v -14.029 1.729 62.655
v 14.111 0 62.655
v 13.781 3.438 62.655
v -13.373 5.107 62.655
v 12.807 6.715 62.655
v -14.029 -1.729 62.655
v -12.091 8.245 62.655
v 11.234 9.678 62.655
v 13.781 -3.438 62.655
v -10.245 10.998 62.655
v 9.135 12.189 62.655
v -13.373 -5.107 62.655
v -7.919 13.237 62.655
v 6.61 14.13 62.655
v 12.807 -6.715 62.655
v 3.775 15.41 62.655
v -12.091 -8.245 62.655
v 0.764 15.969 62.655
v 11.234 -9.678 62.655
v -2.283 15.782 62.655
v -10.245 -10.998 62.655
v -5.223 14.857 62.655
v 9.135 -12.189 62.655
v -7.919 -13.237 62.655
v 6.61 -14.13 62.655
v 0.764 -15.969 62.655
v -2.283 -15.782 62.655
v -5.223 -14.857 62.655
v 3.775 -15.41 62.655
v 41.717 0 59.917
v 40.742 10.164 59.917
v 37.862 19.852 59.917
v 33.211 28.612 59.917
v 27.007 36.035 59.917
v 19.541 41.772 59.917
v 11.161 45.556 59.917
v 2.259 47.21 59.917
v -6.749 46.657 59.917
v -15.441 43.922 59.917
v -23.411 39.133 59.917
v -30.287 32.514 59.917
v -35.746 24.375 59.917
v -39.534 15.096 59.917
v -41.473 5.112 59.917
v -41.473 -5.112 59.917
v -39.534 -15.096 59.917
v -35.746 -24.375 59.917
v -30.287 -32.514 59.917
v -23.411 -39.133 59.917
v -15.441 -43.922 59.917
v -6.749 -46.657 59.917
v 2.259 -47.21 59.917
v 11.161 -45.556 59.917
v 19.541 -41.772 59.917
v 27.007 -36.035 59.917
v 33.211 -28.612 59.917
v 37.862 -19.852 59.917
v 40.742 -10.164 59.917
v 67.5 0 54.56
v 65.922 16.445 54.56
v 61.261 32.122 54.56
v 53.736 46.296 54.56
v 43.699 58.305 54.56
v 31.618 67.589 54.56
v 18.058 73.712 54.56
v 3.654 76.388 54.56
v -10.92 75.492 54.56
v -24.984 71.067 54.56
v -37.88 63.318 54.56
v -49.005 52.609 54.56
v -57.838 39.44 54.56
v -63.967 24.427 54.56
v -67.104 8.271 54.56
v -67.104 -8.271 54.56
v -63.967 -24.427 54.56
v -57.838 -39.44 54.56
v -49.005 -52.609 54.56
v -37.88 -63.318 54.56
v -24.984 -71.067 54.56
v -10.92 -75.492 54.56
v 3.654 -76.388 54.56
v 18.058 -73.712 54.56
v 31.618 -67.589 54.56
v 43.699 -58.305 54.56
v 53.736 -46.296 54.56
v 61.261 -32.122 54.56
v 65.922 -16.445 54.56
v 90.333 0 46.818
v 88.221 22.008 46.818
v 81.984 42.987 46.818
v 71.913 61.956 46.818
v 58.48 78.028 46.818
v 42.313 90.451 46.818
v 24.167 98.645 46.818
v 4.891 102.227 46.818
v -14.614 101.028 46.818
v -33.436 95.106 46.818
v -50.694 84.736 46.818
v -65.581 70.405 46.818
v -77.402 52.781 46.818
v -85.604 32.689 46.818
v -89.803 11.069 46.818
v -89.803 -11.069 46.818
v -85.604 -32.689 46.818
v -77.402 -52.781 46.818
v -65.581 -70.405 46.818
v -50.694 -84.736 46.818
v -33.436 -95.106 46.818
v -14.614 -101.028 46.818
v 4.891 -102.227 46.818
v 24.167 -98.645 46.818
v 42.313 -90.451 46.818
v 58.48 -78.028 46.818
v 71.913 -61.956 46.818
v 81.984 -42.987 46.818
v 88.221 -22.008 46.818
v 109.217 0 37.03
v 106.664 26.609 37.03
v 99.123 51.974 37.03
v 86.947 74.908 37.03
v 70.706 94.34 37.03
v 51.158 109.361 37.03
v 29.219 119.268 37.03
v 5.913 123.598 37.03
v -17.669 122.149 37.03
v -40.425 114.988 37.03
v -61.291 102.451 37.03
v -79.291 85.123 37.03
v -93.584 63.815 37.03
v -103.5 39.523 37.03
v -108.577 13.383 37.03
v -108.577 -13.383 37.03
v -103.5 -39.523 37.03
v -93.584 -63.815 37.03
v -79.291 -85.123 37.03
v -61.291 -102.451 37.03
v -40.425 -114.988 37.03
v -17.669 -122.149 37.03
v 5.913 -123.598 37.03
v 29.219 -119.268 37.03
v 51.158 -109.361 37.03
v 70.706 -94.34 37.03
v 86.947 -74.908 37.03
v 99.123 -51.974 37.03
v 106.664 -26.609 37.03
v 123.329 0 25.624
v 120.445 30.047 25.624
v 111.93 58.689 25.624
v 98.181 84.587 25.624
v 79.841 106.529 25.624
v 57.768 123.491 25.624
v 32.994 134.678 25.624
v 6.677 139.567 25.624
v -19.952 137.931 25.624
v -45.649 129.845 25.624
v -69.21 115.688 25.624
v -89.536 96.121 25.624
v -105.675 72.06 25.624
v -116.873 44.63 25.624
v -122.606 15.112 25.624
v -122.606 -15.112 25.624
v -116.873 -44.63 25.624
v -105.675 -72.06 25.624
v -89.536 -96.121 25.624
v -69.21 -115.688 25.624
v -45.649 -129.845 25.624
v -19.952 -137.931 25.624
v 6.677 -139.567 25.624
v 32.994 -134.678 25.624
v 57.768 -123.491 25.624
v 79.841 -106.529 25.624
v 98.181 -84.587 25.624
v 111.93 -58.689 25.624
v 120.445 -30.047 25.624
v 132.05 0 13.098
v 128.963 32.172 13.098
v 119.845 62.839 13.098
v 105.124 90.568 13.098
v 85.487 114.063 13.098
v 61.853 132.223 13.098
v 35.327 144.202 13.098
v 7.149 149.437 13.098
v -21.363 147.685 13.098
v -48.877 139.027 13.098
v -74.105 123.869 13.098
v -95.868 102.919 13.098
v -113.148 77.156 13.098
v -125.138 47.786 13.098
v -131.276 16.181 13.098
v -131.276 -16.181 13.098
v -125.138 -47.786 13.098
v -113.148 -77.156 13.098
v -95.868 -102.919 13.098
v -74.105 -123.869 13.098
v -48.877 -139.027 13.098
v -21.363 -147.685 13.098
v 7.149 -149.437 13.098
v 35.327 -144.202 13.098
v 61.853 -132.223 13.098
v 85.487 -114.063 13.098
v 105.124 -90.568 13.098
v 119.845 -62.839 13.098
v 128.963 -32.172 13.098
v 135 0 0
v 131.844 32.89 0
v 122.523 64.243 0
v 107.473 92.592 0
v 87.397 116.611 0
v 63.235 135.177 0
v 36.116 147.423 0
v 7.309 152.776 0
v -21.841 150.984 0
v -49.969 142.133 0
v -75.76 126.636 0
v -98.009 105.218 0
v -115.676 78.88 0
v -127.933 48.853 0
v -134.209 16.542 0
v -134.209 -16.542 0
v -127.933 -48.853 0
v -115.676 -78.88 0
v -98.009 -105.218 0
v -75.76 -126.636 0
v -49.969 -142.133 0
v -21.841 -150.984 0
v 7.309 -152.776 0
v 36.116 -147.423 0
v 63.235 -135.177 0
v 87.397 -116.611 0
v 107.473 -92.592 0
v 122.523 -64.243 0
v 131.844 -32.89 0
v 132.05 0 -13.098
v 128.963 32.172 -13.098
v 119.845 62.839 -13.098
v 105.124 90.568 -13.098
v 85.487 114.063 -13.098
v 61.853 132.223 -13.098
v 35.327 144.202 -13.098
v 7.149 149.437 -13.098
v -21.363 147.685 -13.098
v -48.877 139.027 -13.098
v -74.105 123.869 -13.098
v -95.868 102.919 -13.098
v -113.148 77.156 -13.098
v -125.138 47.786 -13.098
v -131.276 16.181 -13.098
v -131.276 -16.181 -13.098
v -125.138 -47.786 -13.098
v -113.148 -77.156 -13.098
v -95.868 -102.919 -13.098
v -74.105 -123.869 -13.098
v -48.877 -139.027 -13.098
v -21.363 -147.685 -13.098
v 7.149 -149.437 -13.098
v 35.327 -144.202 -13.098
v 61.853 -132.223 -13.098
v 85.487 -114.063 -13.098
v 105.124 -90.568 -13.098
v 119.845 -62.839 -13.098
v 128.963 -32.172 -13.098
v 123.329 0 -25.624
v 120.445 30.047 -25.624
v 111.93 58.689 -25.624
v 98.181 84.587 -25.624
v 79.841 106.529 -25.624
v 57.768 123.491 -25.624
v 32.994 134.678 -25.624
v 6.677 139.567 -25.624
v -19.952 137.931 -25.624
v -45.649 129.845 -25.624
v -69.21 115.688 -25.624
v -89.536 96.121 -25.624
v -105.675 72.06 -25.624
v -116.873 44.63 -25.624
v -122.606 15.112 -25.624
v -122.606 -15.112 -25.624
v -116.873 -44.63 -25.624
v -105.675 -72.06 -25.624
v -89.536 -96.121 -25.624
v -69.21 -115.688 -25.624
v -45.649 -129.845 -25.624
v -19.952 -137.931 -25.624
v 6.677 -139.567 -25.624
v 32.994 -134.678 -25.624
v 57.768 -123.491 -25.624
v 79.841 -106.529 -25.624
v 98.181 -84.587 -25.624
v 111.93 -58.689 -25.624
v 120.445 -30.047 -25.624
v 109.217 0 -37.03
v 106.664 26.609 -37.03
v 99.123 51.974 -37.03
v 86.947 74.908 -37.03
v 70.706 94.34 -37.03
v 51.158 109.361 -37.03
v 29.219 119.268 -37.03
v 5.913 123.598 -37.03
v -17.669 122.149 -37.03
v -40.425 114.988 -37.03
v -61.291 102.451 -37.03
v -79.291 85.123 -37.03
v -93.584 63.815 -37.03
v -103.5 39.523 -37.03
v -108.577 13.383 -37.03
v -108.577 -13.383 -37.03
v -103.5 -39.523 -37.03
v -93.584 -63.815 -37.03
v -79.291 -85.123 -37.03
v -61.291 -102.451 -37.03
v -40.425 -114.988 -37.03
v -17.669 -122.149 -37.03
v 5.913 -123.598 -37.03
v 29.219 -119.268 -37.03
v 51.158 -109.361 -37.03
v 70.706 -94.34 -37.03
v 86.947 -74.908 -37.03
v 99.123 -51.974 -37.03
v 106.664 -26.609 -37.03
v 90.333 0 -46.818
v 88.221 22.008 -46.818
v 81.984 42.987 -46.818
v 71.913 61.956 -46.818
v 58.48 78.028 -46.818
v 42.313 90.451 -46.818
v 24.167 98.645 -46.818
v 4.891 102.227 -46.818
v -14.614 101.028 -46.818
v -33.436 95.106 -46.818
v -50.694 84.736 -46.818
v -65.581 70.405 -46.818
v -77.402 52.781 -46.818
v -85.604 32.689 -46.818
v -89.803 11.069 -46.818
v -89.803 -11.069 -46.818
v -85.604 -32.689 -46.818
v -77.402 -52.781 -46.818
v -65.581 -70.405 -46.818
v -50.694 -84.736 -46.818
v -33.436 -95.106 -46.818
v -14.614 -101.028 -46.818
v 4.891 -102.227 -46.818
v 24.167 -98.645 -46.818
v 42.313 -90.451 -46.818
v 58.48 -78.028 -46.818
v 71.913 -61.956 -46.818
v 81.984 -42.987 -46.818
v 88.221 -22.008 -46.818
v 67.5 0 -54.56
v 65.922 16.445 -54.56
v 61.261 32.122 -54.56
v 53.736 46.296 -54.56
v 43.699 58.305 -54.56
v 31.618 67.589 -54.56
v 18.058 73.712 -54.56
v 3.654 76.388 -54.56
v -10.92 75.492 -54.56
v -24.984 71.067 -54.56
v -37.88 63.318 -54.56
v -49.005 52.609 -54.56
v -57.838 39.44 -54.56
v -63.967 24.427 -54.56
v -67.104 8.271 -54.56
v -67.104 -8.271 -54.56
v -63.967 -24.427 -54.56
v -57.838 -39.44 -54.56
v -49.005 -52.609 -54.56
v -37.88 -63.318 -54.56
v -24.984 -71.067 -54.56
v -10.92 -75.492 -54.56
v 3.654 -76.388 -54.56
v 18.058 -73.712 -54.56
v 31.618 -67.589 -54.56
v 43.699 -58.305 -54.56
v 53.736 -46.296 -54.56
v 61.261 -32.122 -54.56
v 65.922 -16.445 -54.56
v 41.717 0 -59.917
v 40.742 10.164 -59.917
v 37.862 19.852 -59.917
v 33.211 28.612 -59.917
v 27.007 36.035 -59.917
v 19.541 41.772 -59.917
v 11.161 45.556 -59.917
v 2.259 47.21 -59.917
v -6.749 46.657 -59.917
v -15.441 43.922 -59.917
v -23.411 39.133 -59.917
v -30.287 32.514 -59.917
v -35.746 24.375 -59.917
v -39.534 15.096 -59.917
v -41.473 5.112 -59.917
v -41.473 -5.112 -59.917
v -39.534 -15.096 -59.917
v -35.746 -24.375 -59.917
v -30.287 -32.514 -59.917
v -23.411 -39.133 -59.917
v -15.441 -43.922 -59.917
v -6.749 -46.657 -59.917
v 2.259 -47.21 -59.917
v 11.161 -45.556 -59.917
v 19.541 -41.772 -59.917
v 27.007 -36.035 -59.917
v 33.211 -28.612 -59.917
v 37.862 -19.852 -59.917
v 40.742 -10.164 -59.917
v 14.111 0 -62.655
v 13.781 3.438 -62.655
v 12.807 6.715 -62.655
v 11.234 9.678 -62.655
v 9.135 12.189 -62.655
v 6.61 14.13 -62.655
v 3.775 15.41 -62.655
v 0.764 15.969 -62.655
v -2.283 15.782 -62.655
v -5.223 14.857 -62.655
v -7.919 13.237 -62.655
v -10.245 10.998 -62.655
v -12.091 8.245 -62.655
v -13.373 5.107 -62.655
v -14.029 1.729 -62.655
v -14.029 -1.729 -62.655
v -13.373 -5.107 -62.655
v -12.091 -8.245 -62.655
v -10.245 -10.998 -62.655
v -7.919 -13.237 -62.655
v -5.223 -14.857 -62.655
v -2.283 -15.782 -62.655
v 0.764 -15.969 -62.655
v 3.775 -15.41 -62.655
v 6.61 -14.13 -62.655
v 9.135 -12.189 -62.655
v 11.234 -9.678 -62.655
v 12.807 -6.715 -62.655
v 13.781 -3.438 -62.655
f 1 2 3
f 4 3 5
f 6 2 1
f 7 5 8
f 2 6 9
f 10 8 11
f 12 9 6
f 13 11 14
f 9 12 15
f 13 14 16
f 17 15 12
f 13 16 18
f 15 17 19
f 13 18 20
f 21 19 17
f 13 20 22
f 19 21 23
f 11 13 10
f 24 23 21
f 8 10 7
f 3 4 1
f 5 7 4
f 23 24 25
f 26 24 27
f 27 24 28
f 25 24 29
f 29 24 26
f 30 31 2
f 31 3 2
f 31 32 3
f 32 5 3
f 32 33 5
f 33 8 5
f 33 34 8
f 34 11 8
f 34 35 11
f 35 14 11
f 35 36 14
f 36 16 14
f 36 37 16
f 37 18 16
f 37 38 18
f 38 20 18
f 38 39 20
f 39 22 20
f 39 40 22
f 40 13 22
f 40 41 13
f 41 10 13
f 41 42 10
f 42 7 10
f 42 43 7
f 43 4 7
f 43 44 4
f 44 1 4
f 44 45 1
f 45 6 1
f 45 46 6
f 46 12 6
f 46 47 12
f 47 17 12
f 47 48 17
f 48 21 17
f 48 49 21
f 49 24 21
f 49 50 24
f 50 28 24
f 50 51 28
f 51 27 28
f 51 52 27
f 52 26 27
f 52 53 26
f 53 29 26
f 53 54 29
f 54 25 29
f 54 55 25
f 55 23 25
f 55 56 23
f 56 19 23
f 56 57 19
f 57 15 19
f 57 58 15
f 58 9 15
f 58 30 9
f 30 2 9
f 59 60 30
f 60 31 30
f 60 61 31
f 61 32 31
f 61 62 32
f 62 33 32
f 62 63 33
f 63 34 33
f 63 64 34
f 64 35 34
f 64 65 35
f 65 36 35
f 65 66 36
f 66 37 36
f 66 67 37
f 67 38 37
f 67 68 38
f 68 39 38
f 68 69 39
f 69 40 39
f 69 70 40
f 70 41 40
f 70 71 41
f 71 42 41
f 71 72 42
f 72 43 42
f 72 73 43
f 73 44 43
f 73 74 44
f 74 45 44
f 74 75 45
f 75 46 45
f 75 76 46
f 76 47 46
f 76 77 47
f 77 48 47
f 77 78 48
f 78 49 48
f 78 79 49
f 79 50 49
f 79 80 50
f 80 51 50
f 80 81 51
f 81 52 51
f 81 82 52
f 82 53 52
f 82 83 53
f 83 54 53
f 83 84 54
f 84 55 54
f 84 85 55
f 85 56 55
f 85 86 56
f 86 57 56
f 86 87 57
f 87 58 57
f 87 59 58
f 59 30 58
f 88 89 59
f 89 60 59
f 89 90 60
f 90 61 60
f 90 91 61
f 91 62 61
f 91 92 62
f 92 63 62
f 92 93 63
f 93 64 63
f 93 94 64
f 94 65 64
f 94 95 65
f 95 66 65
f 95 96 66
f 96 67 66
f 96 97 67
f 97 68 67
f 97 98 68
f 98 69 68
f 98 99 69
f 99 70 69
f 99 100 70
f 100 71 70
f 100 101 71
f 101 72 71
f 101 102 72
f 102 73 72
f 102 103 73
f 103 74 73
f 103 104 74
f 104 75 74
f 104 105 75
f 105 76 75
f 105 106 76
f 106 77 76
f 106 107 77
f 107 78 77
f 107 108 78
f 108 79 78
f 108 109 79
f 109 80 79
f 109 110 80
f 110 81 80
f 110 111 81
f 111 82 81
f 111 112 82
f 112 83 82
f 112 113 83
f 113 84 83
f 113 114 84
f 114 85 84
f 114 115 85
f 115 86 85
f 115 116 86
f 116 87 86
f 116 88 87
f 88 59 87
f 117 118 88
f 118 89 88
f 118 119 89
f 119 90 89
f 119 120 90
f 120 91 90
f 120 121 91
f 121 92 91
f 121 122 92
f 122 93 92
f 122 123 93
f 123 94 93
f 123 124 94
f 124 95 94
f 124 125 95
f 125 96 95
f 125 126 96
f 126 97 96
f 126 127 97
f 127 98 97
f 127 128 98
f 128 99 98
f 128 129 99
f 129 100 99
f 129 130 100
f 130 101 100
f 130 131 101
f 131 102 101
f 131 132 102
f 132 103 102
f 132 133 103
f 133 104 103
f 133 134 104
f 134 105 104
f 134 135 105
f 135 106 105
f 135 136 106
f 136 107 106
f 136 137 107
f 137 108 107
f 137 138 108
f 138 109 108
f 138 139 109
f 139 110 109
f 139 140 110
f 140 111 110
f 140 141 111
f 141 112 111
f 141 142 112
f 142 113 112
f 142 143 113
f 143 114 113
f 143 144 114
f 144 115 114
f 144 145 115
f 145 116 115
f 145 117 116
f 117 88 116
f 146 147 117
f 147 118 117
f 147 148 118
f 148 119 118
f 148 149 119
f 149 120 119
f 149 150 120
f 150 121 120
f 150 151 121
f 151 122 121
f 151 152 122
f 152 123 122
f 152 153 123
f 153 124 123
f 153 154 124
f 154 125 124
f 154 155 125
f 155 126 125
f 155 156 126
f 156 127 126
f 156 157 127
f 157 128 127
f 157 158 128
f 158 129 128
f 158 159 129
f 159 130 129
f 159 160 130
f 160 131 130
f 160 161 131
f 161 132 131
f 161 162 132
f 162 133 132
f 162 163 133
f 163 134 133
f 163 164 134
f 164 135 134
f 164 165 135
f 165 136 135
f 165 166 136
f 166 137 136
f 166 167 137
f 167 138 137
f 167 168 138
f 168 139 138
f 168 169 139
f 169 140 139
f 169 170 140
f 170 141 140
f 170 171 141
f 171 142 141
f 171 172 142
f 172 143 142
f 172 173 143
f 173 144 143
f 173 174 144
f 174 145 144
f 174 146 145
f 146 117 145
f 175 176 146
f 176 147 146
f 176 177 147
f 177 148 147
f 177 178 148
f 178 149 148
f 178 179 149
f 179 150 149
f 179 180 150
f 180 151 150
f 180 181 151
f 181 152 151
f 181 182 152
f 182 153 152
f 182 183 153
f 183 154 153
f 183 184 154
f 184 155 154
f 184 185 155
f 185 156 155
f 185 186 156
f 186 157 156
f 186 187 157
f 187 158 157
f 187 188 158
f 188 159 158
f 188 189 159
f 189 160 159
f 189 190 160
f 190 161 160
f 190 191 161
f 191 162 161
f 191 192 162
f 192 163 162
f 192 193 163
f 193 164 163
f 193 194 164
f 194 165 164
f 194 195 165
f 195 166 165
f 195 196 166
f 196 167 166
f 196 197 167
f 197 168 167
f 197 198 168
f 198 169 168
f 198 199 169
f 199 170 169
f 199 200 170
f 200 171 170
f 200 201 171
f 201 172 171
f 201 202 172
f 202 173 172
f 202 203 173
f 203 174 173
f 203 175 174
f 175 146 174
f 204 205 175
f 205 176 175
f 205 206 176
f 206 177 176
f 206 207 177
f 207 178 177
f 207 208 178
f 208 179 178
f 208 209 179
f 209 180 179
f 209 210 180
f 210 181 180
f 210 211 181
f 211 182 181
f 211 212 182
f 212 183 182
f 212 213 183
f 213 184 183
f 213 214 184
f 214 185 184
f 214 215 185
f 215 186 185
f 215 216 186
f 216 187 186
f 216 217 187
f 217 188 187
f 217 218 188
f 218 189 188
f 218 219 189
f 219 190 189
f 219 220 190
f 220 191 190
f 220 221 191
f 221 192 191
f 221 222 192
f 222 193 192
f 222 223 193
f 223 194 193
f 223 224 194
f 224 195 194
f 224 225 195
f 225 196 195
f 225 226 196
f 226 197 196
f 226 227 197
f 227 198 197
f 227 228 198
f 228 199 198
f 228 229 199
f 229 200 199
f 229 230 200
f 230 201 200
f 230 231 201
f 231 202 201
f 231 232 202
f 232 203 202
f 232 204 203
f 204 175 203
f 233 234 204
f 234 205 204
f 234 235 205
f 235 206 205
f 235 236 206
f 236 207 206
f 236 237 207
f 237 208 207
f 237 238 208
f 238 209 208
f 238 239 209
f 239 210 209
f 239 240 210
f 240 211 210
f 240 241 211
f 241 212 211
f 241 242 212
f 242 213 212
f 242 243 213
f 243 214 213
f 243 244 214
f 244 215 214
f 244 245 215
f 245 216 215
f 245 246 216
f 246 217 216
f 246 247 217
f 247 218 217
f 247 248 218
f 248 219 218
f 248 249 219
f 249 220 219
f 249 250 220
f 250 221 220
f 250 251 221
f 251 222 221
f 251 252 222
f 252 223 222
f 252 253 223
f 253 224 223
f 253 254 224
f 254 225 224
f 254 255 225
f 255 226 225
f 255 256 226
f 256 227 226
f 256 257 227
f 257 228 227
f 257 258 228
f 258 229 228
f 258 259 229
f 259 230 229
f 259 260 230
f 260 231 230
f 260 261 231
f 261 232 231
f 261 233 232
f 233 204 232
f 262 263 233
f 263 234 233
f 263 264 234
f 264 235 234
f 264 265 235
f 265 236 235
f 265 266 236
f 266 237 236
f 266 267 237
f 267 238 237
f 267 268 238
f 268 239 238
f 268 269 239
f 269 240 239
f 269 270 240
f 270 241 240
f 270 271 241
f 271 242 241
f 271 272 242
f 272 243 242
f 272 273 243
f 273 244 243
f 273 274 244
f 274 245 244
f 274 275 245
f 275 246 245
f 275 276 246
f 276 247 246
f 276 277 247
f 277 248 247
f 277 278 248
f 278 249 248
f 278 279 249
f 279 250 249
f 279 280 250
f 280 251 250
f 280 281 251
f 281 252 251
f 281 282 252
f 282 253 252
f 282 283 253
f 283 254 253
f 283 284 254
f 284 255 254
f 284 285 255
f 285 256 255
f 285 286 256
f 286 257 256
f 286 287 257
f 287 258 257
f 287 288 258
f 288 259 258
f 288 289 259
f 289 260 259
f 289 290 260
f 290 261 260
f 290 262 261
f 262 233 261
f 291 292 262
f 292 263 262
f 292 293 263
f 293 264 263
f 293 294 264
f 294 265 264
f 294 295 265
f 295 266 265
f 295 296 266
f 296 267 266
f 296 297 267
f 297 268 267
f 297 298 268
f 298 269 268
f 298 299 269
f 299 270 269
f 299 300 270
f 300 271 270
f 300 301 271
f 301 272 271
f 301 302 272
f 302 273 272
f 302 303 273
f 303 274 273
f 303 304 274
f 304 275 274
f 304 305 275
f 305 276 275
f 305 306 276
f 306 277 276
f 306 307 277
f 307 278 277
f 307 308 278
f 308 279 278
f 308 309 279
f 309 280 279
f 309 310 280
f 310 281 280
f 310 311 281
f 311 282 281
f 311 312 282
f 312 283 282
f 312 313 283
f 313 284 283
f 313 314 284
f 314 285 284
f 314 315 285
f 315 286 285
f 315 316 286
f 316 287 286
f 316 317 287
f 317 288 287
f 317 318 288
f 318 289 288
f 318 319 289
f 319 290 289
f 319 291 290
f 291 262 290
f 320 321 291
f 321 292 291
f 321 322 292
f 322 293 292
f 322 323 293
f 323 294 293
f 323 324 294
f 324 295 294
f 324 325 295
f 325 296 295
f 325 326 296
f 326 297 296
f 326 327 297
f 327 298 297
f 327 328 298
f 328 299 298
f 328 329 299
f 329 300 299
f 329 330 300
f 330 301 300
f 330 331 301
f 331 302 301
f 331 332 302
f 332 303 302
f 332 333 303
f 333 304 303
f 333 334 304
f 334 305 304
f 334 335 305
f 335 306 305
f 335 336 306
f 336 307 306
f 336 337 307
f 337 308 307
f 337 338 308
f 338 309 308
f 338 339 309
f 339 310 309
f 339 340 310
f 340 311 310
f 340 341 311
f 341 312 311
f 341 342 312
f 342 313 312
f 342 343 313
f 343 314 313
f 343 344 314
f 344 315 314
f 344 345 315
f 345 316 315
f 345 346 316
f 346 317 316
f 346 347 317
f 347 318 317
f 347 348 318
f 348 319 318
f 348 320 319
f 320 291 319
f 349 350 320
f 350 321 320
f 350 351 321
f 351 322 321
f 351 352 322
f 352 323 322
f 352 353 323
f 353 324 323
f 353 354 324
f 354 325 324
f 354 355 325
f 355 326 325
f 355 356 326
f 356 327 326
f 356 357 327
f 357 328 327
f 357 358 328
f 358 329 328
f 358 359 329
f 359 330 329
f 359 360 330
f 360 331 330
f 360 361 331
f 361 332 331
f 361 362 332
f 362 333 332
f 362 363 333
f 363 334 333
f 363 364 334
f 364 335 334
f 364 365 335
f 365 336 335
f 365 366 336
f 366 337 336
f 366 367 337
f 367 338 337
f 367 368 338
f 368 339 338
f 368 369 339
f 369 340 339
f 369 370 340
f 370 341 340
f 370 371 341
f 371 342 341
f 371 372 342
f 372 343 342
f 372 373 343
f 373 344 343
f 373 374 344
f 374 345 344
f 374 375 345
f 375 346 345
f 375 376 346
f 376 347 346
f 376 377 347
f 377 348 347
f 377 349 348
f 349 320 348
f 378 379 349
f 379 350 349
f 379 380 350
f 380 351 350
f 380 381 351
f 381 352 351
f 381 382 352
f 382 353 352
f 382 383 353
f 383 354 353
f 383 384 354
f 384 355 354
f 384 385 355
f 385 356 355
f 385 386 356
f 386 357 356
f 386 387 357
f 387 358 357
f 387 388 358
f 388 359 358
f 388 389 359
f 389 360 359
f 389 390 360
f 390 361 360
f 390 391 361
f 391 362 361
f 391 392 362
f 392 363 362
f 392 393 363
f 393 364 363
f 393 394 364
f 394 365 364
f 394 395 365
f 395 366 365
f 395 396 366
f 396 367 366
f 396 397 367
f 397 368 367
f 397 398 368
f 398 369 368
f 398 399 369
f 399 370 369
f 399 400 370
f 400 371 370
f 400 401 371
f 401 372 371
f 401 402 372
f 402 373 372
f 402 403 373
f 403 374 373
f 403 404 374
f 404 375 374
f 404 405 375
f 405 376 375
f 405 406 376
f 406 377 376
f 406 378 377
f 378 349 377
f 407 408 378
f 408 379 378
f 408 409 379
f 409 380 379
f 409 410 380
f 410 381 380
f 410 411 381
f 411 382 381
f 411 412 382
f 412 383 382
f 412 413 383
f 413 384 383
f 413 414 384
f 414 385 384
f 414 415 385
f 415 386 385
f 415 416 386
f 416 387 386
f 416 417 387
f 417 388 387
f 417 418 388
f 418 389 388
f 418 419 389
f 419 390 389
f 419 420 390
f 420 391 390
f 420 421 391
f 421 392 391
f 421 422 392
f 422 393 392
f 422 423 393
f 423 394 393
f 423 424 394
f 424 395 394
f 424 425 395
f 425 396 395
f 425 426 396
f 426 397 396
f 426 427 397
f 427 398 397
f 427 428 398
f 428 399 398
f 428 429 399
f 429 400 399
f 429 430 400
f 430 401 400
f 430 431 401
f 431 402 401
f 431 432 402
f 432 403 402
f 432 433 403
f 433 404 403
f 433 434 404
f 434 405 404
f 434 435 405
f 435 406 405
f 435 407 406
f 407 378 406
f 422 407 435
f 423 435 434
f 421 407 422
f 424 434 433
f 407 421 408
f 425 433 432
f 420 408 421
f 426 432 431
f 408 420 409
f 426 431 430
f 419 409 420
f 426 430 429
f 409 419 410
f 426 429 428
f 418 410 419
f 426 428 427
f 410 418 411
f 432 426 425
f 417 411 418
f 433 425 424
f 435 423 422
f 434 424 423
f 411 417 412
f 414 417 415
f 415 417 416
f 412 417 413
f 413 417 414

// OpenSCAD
// Generated by SolidPython 1.0.1 on 2020-07-29 00:46:52


scale(v = [15, 17, 7]) {
	sphere(r = 9);
}
/***********************************************
*********      SolidPython code:      **********
************************************************
 
# import packages: SolidPython
from solid import *
from solid.utils import *
from itertools import chain, combinations, permutations


class Resize:

    def __init__(self, scad_file):
        self.scad_file = scad_file
        #self.scad_file = import_scad(scad_file)
        # cone/cylinder param:
        self.r1 = 0
        self.r2 = 0
        self.h = 0
        # rectangular prism param:
        self.w = 0
        self.l = 0
        # ellipse param:
        self.r = 0

    # import OpenScad code (file name corresponds to shape)


    # classify shape + parameters
    def assign(self, param1, param2, param3):
        if self.scad_file == 'cone.scad':
            self.r1 = param1
            self.r2 = param2
            self.h = param3
        elif self.scad_file == 'cylinder.scad':
            self.r1 = param1
            self.r2 = param2
            self.h = param3
        elif self.scad_file == 'rectangularPrism.scad':
            self.h = param1
            self.l = param2
            self.w = param3
        else:
            self.r = param1
            self.h = param2

    # resize parameters
    def iterate(self):
        x = range(3, 20, 2)
        i = 1
        if self.scad_file == 'cone.scad':
            tempList = list(permutations(x, 2))
            for temp in tempList:
                param1 = temp[0]
                param2 = temp[1]
                filepath = 'produced_scad_files/' + 'cone' + str(param1) + '_' + str(param2) + '_' + '.scad'
                scad_render_to_file(cylinder(h=param1, r1=param2, r2=0), filepath)

        elif self.scad_file == 'cylinder.scad':
            tempList = list(permutations(x, 3))
            for temp in tempList:
                param1 = temp[0]
                param2 = temp[1]
                filepath = 'produced_scad_files/' + 'cylinder' + str(param1) + '_' + str(param2) + '_' + '.scad'
                scad_render_to_file(cylinder(h=param1, r1=param2, r2=param2), filepath)

        elif self.scad_file == 'rectangularPrism.scad':
            tempList = list(permutations(x, 3))
            for temp in tempList:
                param1 = temp[0]
                param2 = temp[1]
                param3 = temp[2]
                filepath = 'produced_scad_files/' + 'rectangularPrism' + str(param1) + '_' + str(param2) + '_' + str(
                    param3) + '.scad'
                scad_render_to_file(cube(size=(param1, param2, param3)), filepath)

        elif self.scad_file == 'ellipse.scad':
            tempList = list(permutations(x, 4))
            for temp in tempList:
                param1 = temp[0]
                param2 = temp[1]
                param3 = temp[2]
                param4 = temp[3]
                filepath = 'produced_scad_files/' + 'ellipse' + str(param1) + '_' + str(param2) + '_' + str(param3) + '_' + str(param4) + '.scad'
                scad_render_to_file(scale([param1, param2, param3])(sphere(r=param4)), filepath)

    def render_to_scadfile(self):
        scad_render_to_file(scad, 'example.scad') 
 
************************************************/
